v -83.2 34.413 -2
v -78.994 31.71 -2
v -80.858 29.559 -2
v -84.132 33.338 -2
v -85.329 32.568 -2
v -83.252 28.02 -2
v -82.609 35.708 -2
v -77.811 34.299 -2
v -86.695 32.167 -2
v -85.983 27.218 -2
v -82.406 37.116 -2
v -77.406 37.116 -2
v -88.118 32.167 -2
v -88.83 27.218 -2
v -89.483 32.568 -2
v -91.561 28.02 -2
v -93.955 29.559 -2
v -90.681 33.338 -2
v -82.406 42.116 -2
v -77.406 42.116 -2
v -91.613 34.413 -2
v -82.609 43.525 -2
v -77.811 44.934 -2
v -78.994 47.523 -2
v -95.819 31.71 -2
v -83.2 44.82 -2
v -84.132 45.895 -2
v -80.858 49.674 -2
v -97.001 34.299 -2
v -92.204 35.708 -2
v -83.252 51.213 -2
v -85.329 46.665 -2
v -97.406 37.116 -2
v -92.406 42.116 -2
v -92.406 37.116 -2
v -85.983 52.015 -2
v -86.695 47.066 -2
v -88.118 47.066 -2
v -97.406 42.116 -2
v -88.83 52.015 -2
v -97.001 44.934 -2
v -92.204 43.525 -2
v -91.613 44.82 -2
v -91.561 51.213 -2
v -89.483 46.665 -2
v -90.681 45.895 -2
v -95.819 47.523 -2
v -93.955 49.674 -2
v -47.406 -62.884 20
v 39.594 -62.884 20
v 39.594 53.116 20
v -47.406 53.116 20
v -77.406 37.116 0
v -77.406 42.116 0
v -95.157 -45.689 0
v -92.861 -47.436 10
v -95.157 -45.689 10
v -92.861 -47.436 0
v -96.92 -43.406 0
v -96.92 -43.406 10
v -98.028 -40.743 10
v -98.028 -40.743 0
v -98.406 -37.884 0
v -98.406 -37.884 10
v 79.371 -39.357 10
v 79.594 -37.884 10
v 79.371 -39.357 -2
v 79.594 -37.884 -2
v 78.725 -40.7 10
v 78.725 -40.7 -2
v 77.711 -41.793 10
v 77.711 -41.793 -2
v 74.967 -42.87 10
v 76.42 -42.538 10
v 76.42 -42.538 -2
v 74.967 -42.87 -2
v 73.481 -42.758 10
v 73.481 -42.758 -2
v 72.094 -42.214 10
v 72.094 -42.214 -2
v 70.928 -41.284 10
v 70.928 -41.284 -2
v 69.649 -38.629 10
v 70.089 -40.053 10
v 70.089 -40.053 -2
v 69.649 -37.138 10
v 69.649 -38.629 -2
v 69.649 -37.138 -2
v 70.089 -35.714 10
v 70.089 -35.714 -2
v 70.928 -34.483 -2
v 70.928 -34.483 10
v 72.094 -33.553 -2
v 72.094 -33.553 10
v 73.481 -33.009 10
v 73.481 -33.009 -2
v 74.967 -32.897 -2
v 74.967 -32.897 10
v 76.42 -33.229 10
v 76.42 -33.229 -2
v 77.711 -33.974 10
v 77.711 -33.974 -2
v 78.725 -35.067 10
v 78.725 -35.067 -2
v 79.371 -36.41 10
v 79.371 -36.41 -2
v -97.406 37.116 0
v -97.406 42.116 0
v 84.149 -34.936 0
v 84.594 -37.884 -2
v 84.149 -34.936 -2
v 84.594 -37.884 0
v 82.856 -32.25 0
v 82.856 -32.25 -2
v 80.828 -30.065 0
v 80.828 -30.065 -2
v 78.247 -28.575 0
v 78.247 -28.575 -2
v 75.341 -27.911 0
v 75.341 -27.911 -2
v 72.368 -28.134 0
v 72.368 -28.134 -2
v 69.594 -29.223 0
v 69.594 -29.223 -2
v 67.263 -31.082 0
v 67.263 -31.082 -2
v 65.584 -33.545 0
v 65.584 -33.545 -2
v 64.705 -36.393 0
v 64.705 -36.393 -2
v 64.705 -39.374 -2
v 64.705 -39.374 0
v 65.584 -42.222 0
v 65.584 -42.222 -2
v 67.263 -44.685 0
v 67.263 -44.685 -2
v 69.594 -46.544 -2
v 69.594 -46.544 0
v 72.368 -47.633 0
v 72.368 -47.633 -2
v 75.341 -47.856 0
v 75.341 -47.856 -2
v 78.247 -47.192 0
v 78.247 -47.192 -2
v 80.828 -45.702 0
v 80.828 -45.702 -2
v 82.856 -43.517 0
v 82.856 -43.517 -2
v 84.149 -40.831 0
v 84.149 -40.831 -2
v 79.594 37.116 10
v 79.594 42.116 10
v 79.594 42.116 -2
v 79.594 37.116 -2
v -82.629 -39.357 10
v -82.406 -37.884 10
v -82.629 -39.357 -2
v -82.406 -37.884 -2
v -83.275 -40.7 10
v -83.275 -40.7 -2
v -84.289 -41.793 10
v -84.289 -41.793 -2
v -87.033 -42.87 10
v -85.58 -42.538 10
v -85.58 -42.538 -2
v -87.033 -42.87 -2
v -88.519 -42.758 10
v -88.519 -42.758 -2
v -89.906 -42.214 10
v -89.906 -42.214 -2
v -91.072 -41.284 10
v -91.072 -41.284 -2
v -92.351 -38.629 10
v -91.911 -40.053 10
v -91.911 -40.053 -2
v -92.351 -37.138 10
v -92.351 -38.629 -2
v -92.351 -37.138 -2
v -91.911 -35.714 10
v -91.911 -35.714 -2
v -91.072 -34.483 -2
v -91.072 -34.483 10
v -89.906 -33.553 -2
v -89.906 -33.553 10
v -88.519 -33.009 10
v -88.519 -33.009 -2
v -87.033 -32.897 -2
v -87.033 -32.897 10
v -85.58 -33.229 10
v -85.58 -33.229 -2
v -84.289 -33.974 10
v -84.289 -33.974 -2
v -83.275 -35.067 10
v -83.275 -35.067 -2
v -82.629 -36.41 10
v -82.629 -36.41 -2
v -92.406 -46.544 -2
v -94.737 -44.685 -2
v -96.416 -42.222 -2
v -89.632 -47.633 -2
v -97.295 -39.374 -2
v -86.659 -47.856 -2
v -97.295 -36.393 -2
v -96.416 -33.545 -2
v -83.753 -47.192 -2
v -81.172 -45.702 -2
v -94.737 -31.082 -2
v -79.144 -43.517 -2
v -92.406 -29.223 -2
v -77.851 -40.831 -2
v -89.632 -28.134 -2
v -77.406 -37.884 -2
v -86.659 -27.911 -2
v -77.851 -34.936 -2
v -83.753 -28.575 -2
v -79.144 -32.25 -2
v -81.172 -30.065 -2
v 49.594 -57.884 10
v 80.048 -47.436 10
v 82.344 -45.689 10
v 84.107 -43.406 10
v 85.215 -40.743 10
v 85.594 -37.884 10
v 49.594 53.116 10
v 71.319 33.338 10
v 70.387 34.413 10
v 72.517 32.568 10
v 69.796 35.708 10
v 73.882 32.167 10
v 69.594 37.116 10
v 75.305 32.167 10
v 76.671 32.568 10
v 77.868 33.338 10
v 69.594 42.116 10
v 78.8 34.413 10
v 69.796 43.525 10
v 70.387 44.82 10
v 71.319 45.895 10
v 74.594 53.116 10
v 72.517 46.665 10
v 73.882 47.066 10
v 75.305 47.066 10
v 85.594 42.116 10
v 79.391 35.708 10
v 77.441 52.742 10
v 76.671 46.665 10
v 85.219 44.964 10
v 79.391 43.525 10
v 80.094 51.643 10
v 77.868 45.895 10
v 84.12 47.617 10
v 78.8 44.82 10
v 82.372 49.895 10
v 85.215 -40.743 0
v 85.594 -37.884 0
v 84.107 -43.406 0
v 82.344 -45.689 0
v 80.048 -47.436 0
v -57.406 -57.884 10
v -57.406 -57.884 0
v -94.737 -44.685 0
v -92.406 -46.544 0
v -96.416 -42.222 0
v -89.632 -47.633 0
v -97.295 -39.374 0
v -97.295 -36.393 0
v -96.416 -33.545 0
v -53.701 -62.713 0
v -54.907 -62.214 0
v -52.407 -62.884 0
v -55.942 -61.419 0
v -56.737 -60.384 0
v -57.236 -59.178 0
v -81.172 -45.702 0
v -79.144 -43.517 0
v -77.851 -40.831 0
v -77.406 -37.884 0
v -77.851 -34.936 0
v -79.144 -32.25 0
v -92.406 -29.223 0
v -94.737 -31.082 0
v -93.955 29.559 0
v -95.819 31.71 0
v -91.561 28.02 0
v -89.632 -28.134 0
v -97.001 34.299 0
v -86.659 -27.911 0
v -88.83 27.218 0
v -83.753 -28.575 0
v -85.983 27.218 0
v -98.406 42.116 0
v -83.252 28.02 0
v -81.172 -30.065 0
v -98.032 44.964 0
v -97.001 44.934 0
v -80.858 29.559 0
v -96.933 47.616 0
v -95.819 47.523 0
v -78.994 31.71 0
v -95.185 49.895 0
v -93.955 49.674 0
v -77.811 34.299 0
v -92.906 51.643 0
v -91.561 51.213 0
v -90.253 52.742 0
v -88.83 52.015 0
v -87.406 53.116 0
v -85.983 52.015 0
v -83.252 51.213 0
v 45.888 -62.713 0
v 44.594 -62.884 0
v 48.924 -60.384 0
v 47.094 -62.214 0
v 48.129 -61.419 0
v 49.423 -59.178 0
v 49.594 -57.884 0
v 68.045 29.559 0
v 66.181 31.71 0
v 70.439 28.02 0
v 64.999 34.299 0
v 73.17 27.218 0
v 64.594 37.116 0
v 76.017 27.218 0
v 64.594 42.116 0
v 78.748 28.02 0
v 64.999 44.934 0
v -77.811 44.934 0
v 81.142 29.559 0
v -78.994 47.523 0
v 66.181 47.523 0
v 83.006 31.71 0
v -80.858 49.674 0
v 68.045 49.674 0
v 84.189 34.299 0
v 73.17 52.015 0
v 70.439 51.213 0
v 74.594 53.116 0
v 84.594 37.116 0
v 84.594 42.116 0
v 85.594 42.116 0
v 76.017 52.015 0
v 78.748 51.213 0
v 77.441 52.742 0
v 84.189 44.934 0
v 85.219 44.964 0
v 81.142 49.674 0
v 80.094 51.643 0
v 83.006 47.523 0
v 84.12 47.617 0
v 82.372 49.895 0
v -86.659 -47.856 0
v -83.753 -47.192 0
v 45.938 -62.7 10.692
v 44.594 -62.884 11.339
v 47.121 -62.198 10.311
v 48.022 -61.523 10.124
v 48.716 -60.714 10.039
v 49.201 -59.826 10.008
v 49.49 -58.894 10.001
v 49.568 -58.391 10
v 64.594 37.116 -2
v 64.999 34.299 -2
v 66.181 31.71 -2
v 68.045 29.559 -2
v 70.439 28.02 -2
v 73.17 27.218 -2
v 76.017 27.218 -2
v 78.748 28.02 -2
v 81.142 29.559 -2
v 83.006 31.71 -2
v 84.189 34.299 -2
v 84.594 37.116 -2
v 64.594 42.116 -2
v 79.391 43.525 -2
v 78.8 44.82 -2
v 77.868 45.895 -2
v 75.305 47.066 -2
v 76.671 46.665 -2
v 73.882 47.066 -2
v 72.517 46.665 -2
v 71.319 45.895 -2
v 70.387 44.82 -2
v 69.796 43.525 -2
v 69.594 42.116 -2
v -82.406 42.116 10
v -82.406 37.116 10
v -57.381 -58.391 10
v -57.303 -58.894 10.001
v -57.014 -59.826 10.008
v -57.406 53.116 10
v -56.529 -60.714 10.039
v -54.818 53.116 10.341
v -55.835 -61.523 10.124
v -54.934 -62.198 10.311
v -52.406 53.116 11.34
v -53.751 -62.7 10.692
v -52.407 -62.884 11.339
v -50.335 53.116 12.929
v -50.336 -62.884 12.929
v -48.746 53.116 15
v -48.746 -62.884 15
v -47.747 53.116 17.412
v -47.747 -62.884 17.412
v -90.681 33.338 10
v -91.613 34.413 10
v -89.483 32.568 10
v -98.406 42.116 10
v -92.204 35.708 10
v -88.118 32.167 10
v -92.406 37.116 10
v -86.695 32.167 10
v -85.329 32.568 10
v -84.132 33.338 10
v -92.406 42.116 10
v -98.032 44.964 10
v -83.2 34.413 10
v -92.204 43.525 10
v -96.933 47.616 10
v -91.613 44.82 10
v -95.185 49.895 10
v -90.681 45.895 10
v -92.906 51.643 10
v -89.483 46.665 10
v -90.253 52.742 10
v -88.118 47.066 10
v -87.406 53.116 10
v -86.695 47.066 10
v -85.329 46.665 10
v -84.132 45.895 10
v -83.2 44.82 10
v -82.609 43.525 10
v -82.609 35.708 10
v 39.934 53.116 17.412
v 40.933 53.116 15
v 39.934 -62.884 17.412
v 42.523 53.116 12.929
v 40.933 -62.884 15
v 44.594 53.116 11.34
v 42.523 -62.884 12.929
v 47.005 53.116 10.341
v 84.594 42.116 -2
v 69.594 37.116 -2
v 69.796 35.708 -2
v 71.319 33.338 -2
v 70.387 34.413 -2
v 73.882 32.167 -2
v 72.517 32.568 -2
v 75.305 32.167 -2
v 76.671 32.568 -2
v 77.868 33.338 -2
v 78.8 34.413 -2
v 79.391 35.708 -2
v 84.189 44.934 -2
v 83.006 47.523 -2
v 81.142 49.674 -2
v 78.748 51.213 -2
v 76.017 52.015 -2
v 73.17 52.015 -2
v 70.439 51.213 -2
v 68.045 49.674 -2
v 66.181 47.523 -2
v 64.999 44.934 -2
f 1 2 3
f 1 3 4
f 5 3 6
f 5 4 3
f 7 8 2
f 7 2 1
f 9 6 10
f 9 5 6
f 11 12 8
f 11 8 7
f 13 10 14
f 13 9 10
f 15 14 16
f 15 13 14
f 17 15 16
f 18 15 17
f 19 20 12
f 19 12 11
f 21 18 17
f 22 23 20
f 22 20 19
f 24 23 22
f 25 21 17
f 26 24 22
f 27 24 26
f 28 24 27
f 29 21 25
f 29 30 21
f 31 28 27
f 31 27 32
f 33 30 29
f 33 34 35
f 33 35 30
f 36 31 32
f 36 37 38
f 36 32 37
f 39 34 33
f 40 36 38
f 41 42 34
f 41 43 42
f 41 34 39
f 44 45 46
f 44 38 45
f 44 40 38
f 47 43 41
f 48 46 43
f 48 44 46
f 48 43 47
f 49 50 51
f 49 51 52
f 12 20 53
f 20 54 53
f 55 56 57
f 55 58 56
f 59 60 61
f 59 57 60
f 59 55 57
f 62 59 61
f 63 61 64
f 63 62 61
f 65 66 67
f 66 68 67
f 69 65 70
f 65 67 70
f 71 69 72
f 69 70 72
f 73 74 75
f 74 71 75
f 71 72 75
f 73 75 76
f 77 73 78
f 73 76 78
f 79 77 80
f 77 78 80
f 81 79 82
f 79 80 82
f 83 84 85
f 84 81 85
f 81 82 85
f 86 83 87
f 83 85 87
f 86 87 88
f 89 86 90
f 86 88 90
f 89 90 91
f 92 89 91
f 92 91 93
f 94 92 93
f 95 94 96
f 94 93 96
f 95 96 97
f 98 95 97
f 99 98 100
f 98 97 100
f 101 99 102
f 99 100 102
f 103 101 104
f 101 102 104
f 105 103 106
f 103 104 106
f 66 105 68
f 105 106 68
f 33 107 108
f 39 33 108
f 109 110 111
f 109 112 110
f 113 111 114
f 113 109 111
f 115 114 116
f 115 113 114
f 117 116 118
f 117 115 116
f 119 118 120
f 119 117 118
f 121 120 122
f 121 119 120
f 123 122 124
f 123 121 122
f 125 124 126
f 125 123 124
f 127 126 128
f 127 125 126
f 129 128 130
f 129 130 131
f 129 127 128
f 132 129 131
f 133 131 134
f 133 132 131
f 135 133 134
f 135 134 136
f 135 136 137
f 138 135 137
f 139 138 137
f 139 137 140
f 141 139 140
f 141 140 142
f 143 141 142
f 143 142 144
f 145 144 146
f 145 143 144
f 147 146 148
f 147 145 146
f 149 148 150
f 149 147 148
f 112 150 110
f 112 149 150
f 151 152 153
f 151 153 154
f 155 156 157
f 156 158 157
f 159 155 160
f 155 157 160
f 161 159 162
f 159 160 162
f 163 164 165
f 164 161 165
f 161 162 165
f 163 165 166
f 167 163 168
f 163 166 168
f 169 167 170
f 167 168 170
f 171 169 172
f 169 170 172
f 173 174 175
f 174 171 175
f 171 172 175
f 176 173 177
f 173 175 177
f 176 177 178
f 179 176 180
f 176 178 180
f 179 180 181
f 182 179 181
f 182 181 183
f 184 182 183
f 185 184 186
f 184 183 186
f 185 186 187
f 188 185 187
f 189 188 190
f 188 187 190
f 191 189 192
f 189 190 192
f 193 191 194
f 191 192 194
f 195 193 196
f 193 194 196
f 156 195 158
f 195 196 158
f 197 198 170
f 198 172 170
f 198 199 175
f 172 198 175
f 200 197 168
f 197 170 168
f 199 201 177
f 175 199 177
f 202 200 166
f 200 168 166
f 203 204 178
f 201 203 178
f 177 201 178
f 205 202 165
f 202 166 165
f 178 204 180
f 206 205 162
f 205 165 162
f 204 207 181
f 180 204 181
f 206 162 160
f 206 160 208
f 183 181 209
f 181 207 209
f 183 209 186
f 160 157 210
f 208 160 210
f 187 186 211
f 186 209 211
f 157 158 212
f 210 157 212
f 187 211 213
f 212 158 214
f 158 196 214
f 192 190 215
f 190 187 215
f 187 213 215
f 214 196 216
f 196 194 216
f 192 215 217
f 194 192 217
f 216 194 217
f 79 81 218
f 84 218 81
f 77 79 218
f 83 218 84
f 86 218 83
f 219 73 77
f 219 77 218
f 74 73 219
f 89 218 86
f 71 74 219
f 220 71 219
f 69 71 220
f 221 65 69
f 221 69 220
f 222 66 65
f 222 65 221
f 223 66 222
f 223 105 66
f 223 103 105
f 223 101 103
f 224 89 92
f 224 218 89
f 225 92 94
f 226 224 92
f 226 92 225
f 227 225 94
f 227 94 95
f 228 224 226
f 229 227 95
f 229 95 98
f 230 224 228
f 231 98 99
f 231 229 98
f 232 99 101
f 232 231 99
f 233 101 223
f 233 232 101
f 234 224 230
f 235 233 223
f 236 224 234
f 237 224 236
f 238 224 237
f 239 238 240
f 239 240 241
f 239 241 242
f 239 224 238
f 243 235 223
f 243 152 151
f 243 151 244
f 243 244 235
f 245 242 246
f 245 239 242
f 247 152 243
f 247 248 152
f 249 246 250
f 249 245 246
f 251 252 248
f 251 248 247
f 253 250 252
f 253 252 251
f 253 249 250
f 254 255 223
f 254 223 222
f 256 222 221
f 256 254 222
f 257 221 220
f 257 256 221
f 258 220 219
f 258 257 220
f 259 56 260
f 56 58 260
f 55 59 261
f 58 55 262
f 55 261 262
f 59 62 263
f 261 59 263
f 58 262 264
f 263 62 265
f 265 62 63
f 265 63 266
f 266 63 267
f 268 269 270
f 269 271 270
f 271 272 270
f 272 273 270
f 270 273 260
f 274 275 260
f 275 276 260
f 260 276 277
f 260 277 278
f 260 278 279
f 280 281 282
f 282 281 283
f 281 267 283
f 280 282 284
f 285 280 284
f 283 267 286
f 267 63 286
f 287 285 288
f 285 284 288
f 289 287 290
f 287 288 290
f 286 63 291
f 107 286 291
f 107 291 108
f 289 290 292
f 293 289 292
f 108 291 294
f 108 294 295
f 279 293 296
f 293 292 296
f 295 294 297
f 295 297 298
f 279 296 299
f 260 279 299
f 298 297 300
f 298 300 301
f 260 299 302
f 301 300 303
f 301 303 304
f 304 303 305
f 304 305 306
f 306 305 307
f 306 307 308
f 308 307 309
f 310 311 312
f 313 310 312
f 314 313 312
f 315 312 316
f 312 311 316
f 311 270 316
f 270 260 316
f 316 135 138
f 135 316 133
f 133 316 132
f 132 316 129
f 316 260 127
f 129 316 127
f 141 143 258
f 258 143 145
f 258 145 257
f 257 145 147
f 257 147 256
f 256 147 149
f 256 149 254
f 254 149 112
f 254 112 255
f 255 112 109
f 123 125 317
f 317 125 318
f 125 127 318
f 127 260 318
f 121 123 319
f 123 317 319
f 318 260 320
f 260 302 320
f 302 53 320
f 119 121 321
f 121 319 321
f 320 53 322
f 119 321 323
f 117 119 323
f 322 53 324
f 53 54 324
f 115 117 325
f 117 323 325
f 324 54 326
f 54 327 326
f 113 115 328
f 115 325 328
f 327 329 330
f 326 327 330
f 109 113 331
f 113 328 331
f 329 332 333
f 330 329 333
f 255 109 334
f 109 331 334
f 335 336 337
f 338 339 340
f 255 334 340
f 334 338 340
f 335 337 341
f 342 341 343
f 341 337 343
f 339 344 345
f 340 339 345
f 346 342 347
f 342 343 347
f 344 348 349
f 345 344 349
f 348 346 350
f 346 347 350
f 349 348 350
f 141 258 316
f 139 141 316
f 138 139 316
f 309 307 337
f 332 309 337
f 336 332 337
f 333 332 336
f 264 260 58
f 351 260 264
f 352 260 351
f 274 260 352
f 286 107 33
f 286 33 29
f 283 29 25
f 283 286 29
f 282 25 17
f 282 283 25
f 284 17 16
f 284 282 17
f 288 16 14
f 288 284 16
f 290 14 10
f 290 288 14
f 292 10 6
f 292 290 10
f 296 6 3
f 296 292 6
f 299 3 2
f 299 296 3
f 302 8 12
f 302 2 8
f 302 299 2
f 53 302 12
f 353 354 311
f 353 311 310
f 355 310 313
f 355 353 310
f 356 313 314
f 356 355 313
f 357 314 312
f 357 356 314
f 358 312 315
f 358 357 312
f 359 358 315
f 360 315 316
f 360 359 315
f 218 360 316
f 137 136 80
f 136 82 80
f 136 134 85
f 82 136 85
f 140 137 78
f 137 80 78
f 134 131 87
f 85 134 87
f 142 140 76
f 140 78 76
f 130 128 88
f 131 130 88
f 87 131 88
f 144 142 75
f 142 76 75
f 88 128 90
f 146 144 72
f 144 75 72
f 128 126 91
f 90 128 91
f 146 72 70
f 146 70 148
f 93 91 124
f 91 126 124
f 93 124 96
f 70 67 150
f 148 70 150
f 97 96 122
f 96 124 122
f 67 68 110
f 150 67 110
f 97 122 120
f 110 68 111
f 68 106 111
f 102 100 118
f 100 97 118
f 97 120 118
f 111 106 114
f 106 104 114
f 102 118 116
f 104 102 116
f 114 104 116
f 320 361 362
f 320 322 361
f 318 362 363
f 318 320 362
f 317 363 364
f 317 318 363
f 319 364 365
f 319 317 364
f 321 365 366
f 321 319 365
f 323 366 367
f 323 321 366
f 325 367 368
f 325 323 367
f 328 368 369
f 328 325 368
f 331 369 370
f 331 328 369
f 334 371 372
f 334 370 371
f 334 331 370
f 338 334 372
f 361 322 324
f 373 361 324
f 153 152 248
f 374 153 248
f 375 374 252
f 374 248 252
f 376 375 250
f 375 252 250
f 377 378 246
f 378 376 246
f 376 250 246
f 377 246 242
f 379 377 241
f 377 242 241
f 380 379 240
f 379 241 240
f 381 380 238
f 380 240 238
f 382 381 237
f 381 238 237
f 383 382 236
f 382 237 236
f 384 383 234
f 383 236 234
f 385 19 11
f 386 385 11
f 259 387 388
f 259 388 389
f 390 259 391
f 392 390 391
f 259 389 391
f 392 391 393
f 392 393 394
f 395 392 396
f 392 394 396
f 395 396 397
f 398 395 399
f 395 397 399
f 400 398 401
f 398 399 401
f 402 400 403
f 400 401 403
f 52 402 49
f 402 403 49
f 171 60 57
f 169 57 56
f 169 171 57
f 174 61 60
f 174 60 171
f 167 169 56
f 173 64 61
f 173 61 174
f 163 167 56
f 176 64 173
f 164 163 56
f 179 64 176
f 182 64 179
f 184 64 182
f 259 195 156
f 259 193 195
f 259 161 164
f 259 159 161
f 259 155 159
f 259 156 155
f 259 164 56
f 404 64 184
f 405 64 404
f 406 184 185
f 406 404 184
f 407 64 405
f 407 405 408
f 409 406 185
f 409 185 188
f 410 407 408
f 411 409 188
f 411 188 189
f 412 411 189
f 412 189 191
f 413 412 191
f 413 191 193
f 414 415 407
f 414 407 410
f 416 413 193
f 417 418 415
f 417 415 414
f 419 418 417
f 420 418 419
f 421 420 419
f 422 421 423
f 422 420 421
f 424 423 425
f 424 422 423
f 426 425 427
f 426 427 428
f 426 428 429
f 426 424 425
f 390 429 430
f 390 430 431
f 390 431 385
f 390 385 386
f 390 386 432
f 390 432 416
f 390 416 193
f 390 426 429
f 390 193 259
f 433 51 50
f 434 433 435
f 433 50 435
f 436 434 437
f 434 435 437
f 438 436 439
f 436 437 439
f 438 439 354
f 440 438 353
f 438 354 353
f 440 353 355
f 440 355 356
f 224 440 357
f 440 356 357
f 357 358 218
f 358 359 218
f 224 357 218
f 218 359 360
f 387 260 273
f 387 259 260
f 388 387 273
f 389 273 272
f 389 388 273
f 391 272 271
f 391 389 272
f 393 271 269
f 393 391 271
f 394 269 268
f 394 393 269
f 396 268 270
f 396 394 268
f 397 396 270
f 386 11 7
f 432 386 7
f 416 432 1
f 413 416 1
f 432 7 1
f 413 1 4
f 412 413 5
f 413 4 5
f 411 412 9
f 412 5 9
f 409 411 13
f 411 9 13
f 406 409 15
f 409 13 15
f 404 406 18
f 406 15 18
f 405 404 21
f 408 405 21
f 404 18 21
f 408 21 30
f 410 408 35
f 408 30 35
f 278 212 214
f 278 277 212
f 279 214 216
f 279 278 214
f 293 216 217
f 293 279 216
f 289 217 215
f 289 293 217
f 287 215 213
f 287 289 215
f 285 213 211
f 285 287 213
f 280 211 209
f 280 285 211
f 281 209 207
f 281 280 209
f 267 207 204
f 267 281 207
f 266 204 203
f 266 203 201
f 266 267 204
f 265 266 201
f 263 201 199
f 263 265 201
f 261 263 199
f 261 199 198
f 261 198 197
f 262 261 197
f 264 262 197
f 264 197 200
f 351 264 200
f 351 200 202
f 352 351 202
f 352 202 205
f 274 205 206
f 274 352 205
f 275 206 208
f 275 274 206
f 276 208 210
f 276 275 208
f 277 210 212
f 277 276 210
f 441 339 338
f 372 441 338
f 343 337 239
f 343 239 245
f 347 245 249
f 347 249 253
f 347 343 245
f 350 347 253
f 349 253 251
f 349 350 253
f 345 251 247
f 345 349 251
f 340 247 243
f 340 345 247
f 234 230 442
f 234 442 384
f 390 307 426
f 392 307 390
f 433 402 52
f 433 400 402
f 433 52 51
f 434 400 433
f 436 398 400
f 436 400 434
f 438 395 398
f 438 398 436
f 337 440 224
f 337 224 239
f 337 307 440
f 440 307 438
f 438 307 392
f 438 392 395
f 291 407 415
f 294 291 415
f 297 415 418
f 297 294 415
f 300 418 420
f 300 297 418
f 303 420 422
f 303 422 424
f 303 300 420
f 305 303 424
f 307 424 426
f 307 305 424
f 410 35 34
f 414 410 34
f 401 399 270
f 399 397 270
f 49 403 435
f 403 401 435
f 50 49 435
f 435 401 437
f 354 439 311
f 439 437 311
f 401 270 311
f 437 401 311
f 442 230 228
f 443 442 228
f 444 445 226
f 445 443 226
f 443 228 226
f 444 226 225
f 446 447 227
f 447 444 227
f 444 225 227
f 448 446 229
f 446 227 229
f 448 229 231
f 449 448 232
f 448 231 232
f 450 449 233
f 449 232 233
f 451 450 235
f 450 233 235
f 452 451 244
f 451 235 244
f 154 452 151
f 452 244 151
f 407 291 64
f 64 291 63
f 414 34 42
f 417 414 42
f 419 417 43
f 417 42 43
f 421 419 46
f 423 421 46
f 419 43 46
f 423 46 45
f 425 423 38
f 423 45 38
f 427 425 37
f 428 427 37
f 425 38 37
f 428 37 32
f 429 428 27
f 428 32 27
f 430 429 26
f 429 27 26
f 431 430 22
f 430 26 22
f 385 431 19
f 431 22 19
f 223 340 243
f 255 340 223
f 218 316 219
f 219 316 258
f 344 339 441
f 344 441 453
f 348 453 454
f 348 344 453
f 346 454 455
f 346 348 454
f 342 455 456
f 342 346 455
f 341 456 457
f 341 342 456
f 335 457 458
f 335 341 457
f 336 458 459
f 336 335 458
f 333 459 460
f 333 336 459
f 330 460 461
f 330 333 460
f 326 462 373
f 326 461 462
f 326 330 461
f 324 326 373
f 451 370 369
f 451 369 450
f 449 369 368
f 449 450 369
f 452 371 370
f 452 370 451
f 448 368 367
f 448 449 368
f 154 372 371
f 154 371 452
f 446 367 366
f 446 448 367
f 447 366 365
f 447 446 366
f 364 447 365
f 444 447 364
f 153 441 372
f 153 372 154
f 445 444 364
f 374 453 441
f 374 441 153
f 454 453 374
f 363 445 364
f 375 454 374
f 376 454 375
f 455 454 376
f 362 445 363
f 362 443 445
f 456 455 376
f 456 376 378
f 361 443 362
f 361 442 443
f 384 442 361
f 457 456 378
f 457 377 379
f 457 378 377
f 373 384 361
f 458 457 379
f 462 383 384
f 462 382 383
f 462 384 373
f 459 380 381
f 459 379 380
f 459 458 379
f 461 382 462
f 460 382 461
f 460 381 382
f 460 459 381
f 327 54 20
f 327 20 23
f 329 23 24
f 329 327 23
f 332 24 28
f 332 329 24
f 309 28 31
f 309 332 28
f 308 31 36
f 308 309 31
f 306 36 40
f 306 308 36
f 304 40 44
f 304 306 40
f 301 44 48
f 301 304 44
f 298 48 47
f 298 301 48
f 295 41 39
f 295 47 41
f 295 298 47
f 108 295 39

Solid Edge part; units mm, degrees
sketch "Sketch1" plane through (0, 0, 0) normal (0, 0, 1) x (1, 0, 0)
  circle A0 centre (-87.4064, -37.8835) radius 5
  circle A1 centre (-87.4064, -37.8835) radius 10
  arc A2 (69.5936, 42.1165) -> (79.5936, 42.1165) centre (74.5936, 42.1165) cw
  line L0 (79.5936, 42.1165) -> (79.5936, 37.1165)
  arc A3 (79.5936, 37.1165) -> (69.5936, 37.1165) centre (74.5936, 37.1165) cw
  line L1 (69.5936, 37.1165) -> (69.5936, 42.1165)
  line L2 (84.5936, 42.1165) -> (84.5936, 37.1165)
  arc A4 (64.5936, 42.1165) -> (84.5936, 42.1165) centre (74.5936, 42.1165) cw
  line L3 (64.5936, 37.1165) -> (64.5936, 42.1165)
  arc A5 (84.5936, 37.1165) -> (64.5936, 37.1165) centre (74.5936, 37.1165) cw
  circle A6 centre (74.5936, -37.8835) radius 5
  circle A7 centre (74.5936, -37.8835) radius 10
  line L4 (-77.4064, 42.1165) -> (-77.4064, 37.1165)
  arc A8 (-77.4064, 37.1165) -> (-97.4064, 37.1165) centre (-87.4064, 37.1165) cw
  line L5 (-97.4064, 37.1165) -> (-97.4064, 42.1165)
  arc A9 (-97.4064, 42.1165) -> (-77.4064, 42.1165) centre (-87.4064, 42.1165) cw
  line L6 (-92.4064, 37.1165) -> (-92.4064, 42.1165)
  arc A10 (-82.4064, 37.1165) -> (-92.4064, 37.1165) centre (-87.4064, 37.1165) cw
  line L7 (-82.4064, 42.1165) -> (-82.4064, 37.1165)
  arc A11 (-92.4064, 42.1165) -> (-82.4064, 42.1165) centre (-87.4064, 42.1165) cw
extrude "Protrusion1" add sketch "Sketch1" against normal blind 2
sketch "Sketch2" plane through (-87.4064, -37.8835, 0) normal (0, 0, 1) x (1, 0, 0)
  arc A0 (5, 75) -> (-5, 75) centre (0, 75) cw
  line L0 (-5, 75) -> (-5, 80)
  arc A1 (-5, 80) -> (5, 80) centre (0, 80) cw
  line L1 (5, 80) -> (5, 75)
  circle A2 centre (0, 0) radius 5
  circle A3 centre (162, 0) radius 5
  arc A4 (167, 75) -> (157, 75) centre (162, 75) cw
  line L2 (157, 75) -> (157, 80)
  arc A5 (157, 80) -> (167, 80) centre (162, 80) cw
  line L3 (167, 80) -> (167, 75)
  line L4 (30, -25) -> (137, -25)
  line L5 (137, -25) -> (137, -20)
  line L6 (137, -20) -> (167.4546, -9.5523)
  arc A6 (173, 0) -> (167.4546, -9.5523) centre (162, 0) cw
  line L7 (173, 80) -> (173, 0)
  arc A7 (162, 91) -> (173, 80) centre (162, 80) cw
  line L8 (0, 91) -> (162, 91)
  arc A8 (-11, 80) -> (0, 91) centre (0, 80) cw
  line L9 (-11, 80) -> (-11, 0)
  arc A9 (-11, 0) -> (-5.4546, -9.5523) centre (0, 0) ccw
  line L10 (-5.4546, -9.5523) -> (30, -20)
  line L11 (30, -20) -> (30, -25)
  dimension "D1" = 1
  dimension "D2" = 25
  dimension "D3" = 30
  dimension "D4" = 25
  dimension "D5" = 5
extrude "ExtrudedProtrusion_2" add sketch "Sketch2" along normal blind 10
sketch "Sketch3" plane through (-6.4064, 53.1165, 5) normal (0, 1, 0) x (-1, 0, 0)
  arc A0 (41, 15) -> (51, 5) centre (51, 15) ccw
  line L0 (-46, 15) -> (41, 15)
  arc A1 (-56, 5) -> (-46, 15) centre (-56, 15) ccw
  line L1 (-56, 5) -> (51, 5)
  dimension "D1" = 10
extrude "Protrusion2" add sketch "Sketch3" along normal up to surface (116 mm away) from surface at -116
fillet "Round_1" radius 5 2 edges at (-57.4064, -62.8835, 5) (49.5936, -62.8835, 5)
